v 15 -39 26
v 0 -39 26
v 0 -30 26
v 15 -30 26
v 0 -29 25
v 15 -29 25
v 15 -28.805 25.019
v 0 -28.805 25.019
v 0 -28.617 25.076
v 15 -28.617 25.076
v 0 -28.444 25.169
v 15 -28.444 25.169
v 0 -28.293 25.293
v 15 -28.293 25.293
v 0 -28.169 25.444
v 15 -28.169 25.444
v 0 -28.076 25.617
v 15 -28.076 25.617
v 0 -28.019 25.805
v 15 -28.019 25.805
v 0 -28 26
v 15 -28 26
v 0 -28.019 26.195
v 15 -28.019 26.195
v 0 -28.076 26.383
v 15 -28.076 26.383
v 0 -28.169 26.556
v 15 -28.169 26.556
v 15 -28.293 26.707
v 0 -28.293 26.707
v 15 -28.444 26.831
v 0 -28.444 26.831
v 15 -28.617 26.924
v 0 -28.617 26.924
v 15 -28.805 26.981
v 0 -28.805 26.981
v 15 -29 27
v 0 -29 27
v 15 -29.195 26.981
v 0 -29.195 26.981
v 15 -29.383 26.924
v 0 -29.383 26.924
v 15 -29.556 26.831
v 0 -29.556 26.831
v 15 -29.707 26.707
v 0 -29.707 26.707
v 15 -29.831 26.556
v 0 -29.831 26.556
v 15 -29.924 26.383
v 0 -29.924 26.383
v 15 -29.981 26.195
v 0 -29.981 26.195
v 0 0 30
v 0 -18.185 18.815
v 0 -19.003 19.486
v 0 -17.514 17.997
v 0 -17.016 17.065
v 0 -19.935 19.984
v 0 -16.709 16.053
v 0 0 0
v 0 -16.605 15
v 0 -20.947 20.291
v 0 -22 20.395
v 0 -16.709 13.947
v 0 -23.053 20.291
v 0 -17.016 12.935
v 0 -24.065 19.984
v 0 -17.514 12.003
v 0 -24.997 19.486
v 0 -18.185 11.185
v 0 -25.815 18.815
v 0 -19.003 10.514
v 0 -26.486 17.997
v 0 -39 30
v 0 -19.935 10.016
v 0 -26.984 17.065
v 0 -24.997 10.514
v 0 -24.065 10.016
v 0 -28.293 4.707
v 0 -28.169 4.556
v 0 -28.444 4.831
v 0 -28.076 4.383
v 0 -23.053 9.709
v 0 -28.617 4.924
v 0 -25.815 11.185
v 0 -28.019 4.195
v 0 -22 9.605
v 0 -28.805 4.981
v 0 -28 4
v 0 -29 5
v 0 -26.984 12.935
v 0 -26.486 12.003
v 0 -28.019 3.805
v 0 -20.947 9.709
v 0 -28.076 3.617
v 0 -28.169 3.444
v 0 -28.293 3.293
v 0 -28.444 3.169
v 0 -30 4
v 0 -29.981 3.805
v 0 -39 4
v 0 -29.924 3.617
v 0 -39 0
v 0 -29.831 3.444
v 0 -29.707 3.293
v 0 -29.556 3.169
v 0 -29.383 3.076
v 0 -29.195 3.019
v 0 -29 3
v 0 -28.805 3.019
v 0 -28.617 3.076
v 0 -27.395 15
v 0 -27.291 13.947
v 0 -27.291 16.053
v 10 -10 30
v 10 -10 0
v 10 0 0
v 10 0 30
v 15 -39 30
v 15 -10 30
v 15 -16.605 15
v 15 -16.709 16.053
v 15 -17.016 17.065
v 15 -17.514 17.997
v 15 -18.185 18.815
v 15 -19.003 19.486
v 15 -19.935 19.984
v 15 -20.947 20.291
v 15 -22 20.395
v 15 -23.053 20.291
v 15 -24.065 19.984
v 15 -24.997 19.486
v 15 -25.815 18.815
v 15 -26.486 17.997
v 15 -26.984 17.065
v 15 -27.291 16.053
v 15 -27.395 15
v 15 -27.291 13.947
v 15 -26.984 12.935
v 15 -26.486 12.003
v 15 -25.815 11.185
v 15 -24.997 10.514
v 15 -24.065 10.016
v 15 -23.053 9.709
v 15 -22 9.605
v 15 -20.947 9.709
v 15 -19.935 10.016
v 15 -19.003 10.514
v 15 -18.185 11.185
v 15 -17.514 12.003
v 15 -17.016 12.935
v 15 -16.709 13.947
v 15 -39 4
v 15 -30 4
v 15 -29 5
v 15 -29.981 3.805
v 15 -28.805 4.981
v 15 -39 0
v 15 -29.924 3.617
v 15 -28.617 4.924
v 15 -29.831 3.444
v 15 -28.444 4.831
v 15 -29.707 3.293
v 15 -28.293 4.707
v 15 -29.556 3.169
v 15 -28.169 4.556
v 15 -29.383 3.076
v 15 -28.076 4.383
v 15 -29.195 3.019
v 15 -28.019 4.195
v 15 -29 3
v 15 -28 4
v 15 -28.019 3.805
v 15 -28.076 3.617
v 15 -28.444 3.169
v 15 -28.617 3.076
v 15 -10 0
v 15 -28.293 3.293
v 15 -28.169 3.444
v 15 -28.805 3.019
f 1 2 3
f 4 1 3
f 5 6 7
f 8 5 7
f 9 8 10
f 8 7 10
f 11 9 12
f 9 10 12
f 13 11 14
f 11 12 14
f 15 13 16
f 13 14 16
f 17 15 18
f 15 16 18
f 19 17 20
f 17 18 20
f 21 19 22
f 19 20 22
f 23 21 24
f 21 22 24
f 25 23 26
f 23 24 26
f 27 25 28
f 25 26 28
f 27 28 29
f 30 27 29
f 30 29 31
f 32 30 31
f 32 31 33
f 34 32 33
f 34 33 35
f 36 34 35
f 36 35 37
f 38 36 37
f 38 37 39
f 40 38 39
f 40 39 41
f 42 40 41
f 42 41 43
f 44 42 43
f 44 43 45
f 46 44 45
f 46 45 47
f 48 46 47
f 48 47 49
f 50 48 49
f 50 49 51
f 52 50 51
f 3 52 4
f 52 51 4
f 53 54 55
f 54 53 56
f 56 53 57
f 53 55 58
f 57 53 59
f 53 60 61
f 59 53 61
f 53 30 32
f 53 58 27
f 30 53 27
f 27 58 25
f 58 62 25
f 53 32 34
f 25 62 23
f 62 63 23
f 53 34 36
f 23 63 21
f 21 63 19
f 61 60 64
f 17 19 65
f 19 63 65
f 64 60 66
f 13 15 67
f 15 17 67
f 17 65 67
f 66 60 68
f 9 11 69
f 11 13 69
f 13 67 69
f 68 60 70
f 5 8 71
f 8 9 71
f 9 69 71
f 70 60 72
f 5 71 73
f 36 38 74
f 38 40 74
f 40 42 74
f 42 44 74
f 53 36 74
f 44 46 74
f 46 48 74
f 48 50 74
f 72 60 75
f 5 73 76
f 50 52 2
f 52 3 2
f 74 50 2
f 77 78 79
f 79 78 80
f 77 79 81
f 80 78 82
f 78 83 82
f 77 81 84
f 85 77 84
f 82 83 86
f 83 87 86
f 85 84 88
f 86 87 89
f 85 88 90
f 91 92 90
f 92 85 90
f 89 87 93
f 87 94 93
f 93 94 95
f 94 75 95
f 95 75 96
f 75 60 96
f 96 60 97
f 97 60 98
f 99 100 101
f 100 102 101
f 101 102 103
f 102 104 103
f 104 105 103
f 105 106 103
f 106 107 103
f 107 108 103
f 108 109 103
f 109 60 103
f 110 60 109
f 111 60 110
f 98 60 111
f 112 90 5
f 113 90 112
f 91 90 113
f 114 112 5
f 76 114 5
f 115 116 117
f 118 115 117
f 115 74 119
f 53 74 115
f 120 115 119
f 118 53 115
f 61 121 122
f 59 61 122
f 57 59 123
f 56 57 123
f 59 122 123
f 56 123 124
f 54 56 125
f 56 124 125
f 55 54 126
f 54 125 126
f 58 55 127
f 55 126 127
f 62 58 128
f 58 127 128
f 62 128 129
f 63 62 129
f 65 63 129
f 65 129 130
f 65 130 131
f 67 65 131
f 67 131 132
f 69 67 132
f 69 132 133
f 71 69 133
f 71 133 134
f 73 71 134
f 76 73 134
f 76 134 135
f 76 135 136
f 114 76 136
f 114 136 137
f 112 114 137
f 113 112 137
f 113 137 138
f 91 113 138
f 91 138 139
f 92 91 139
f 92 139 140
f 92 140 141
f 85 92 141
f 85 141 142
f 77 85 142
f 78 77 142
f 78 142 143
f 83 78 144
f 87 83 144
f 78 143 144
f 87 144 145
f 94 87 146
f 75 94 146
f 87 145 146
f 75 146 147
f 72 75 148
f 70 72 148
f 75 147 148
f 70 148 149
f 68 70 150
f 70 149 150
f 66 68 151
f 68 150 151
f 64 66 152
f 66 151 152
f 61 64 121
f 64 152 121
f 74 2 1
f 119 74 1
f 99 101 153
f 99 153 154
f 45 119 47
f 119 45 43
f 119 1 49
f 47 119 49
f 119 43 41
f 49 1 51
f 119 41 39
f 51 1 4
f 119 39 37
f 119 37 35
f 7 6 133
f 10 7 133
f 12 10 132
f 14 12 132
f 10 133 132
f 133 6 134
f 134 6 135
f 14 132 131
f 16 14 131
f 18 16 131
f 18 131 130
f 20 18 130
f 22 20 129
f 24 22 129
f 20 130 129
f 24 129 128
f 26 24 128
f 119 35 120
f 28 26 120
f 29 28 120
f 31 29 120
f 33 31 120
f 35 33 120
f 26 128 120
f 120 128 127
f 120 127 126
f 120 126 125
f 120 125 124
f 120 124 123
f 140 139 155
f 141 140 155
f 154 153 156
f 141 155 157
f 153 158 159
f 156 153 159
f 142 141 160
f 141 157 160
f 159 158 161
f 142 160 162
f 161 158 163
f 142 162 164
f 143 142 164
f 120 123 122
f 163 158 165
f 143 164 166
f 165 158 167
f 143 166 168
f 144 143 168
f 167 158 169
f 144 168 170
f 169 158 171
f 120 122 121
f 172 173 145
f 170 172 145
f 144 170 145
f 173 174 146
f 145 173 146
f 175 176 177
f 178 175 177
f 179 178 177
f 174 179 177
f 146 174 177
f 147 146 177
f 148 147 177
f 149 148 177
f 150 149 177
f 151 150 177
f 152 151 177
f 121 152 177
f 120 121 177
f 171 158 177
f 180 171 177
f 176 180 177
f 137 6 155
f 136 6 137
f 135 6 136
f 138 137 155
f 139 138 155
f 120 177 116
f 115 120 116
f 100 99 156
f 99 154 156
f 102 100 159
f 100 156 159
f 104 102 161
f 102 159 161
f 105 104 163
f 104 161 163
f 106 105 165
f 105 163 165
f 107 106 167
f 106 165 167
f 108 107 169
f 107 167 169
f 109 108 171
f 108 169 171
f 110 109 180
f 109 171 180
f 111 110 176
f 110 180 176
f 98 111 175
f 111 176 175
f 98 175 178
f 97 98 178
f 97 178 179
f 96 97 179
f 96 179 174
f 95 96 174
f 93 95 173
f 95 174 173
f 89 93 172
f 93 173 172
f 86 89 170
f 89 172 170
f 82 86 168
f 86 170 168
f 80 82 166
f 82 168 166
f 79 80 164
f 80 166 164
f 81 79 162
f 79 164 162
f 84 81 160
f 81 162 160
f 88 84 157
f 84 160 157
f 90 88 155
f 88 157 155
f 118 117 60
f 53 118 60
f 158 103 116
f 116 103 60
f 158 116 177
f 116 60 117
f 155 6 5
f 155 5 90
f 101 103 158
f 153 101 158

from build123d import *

# Parameters (mm, degrees)
RESSALTO_EXTRUS_O1_DEPTH = 30
ESBO_O2_W                = 22
ESBO_O2_H                = 10
CORTE_EXTRUS_O1_DEPTH    = 52.439284598
ESBO_O3_R                = 1
CORTE_EXTRUS_O2_DEPTH    = 52.439284598
ESBO_O4_R                = 5.395012771
CORTE_EXTRUS_O3_DEPTH    = 52.439284598


with BuildPart() as part:
    # Esboço1 → Ressalto-extrusão1 (new body)
    with BuildSketch(Plane.XY):
        Polygon((0, 0), (0, -39), (15, -39), (15, -10), (10, -10), (10, 0), align=None)
    extrude(amount=RESSALTO_EXTRUS_O1_DEPTH)

    # Esboço2 → Corte-extrusão1 (cut, through all)
    with BuildSketch(Plane(origin=(15, 0, 0), x_dir=(0, 0, -1), z_dir=(1, 0, 0))):
        with Locations((-15, -34)):
            Rectangle(ESBO_O2_W, ESBO_O2_H)
    extrude(amount=-CORTE_EXTRUS_O1_DEPTH, mode=Mode.SUBTRACT)

    # Esboço3 → Corte-extrusão2 (cut, through all)
    with BuildSketch(Plane(origin=(15, 0, 0), x_dir=(0, 0, -1), z_dir=(1, 0, 0))):
        with Locations((-26, -29)):
            Circle(ESBO_O3_R)
        with Locations((-4, -29)):
            Circle(ESBO_O3_R)
    extrude(amount=-CORTE_EXTRUS_O2_DEPTH, mode=Mode.SUBTRACT)

    # Esboço4 → Corte-extrusão3 (cut, through all)
    with BuildSketch(Plane(origin=(15, 0, 0), x_dir=(0, 0, -1), z_dir=(1, 0, 0))):
        with Locations(Location((-15, -22, 0), (0, 0, 90))):
            Circle(ESBO_O4_R)
    extrude(amount=-CORTE_EXTRUS_O3_DEPTH, mode=Mode.SUBTRACT)


solid = part.part
